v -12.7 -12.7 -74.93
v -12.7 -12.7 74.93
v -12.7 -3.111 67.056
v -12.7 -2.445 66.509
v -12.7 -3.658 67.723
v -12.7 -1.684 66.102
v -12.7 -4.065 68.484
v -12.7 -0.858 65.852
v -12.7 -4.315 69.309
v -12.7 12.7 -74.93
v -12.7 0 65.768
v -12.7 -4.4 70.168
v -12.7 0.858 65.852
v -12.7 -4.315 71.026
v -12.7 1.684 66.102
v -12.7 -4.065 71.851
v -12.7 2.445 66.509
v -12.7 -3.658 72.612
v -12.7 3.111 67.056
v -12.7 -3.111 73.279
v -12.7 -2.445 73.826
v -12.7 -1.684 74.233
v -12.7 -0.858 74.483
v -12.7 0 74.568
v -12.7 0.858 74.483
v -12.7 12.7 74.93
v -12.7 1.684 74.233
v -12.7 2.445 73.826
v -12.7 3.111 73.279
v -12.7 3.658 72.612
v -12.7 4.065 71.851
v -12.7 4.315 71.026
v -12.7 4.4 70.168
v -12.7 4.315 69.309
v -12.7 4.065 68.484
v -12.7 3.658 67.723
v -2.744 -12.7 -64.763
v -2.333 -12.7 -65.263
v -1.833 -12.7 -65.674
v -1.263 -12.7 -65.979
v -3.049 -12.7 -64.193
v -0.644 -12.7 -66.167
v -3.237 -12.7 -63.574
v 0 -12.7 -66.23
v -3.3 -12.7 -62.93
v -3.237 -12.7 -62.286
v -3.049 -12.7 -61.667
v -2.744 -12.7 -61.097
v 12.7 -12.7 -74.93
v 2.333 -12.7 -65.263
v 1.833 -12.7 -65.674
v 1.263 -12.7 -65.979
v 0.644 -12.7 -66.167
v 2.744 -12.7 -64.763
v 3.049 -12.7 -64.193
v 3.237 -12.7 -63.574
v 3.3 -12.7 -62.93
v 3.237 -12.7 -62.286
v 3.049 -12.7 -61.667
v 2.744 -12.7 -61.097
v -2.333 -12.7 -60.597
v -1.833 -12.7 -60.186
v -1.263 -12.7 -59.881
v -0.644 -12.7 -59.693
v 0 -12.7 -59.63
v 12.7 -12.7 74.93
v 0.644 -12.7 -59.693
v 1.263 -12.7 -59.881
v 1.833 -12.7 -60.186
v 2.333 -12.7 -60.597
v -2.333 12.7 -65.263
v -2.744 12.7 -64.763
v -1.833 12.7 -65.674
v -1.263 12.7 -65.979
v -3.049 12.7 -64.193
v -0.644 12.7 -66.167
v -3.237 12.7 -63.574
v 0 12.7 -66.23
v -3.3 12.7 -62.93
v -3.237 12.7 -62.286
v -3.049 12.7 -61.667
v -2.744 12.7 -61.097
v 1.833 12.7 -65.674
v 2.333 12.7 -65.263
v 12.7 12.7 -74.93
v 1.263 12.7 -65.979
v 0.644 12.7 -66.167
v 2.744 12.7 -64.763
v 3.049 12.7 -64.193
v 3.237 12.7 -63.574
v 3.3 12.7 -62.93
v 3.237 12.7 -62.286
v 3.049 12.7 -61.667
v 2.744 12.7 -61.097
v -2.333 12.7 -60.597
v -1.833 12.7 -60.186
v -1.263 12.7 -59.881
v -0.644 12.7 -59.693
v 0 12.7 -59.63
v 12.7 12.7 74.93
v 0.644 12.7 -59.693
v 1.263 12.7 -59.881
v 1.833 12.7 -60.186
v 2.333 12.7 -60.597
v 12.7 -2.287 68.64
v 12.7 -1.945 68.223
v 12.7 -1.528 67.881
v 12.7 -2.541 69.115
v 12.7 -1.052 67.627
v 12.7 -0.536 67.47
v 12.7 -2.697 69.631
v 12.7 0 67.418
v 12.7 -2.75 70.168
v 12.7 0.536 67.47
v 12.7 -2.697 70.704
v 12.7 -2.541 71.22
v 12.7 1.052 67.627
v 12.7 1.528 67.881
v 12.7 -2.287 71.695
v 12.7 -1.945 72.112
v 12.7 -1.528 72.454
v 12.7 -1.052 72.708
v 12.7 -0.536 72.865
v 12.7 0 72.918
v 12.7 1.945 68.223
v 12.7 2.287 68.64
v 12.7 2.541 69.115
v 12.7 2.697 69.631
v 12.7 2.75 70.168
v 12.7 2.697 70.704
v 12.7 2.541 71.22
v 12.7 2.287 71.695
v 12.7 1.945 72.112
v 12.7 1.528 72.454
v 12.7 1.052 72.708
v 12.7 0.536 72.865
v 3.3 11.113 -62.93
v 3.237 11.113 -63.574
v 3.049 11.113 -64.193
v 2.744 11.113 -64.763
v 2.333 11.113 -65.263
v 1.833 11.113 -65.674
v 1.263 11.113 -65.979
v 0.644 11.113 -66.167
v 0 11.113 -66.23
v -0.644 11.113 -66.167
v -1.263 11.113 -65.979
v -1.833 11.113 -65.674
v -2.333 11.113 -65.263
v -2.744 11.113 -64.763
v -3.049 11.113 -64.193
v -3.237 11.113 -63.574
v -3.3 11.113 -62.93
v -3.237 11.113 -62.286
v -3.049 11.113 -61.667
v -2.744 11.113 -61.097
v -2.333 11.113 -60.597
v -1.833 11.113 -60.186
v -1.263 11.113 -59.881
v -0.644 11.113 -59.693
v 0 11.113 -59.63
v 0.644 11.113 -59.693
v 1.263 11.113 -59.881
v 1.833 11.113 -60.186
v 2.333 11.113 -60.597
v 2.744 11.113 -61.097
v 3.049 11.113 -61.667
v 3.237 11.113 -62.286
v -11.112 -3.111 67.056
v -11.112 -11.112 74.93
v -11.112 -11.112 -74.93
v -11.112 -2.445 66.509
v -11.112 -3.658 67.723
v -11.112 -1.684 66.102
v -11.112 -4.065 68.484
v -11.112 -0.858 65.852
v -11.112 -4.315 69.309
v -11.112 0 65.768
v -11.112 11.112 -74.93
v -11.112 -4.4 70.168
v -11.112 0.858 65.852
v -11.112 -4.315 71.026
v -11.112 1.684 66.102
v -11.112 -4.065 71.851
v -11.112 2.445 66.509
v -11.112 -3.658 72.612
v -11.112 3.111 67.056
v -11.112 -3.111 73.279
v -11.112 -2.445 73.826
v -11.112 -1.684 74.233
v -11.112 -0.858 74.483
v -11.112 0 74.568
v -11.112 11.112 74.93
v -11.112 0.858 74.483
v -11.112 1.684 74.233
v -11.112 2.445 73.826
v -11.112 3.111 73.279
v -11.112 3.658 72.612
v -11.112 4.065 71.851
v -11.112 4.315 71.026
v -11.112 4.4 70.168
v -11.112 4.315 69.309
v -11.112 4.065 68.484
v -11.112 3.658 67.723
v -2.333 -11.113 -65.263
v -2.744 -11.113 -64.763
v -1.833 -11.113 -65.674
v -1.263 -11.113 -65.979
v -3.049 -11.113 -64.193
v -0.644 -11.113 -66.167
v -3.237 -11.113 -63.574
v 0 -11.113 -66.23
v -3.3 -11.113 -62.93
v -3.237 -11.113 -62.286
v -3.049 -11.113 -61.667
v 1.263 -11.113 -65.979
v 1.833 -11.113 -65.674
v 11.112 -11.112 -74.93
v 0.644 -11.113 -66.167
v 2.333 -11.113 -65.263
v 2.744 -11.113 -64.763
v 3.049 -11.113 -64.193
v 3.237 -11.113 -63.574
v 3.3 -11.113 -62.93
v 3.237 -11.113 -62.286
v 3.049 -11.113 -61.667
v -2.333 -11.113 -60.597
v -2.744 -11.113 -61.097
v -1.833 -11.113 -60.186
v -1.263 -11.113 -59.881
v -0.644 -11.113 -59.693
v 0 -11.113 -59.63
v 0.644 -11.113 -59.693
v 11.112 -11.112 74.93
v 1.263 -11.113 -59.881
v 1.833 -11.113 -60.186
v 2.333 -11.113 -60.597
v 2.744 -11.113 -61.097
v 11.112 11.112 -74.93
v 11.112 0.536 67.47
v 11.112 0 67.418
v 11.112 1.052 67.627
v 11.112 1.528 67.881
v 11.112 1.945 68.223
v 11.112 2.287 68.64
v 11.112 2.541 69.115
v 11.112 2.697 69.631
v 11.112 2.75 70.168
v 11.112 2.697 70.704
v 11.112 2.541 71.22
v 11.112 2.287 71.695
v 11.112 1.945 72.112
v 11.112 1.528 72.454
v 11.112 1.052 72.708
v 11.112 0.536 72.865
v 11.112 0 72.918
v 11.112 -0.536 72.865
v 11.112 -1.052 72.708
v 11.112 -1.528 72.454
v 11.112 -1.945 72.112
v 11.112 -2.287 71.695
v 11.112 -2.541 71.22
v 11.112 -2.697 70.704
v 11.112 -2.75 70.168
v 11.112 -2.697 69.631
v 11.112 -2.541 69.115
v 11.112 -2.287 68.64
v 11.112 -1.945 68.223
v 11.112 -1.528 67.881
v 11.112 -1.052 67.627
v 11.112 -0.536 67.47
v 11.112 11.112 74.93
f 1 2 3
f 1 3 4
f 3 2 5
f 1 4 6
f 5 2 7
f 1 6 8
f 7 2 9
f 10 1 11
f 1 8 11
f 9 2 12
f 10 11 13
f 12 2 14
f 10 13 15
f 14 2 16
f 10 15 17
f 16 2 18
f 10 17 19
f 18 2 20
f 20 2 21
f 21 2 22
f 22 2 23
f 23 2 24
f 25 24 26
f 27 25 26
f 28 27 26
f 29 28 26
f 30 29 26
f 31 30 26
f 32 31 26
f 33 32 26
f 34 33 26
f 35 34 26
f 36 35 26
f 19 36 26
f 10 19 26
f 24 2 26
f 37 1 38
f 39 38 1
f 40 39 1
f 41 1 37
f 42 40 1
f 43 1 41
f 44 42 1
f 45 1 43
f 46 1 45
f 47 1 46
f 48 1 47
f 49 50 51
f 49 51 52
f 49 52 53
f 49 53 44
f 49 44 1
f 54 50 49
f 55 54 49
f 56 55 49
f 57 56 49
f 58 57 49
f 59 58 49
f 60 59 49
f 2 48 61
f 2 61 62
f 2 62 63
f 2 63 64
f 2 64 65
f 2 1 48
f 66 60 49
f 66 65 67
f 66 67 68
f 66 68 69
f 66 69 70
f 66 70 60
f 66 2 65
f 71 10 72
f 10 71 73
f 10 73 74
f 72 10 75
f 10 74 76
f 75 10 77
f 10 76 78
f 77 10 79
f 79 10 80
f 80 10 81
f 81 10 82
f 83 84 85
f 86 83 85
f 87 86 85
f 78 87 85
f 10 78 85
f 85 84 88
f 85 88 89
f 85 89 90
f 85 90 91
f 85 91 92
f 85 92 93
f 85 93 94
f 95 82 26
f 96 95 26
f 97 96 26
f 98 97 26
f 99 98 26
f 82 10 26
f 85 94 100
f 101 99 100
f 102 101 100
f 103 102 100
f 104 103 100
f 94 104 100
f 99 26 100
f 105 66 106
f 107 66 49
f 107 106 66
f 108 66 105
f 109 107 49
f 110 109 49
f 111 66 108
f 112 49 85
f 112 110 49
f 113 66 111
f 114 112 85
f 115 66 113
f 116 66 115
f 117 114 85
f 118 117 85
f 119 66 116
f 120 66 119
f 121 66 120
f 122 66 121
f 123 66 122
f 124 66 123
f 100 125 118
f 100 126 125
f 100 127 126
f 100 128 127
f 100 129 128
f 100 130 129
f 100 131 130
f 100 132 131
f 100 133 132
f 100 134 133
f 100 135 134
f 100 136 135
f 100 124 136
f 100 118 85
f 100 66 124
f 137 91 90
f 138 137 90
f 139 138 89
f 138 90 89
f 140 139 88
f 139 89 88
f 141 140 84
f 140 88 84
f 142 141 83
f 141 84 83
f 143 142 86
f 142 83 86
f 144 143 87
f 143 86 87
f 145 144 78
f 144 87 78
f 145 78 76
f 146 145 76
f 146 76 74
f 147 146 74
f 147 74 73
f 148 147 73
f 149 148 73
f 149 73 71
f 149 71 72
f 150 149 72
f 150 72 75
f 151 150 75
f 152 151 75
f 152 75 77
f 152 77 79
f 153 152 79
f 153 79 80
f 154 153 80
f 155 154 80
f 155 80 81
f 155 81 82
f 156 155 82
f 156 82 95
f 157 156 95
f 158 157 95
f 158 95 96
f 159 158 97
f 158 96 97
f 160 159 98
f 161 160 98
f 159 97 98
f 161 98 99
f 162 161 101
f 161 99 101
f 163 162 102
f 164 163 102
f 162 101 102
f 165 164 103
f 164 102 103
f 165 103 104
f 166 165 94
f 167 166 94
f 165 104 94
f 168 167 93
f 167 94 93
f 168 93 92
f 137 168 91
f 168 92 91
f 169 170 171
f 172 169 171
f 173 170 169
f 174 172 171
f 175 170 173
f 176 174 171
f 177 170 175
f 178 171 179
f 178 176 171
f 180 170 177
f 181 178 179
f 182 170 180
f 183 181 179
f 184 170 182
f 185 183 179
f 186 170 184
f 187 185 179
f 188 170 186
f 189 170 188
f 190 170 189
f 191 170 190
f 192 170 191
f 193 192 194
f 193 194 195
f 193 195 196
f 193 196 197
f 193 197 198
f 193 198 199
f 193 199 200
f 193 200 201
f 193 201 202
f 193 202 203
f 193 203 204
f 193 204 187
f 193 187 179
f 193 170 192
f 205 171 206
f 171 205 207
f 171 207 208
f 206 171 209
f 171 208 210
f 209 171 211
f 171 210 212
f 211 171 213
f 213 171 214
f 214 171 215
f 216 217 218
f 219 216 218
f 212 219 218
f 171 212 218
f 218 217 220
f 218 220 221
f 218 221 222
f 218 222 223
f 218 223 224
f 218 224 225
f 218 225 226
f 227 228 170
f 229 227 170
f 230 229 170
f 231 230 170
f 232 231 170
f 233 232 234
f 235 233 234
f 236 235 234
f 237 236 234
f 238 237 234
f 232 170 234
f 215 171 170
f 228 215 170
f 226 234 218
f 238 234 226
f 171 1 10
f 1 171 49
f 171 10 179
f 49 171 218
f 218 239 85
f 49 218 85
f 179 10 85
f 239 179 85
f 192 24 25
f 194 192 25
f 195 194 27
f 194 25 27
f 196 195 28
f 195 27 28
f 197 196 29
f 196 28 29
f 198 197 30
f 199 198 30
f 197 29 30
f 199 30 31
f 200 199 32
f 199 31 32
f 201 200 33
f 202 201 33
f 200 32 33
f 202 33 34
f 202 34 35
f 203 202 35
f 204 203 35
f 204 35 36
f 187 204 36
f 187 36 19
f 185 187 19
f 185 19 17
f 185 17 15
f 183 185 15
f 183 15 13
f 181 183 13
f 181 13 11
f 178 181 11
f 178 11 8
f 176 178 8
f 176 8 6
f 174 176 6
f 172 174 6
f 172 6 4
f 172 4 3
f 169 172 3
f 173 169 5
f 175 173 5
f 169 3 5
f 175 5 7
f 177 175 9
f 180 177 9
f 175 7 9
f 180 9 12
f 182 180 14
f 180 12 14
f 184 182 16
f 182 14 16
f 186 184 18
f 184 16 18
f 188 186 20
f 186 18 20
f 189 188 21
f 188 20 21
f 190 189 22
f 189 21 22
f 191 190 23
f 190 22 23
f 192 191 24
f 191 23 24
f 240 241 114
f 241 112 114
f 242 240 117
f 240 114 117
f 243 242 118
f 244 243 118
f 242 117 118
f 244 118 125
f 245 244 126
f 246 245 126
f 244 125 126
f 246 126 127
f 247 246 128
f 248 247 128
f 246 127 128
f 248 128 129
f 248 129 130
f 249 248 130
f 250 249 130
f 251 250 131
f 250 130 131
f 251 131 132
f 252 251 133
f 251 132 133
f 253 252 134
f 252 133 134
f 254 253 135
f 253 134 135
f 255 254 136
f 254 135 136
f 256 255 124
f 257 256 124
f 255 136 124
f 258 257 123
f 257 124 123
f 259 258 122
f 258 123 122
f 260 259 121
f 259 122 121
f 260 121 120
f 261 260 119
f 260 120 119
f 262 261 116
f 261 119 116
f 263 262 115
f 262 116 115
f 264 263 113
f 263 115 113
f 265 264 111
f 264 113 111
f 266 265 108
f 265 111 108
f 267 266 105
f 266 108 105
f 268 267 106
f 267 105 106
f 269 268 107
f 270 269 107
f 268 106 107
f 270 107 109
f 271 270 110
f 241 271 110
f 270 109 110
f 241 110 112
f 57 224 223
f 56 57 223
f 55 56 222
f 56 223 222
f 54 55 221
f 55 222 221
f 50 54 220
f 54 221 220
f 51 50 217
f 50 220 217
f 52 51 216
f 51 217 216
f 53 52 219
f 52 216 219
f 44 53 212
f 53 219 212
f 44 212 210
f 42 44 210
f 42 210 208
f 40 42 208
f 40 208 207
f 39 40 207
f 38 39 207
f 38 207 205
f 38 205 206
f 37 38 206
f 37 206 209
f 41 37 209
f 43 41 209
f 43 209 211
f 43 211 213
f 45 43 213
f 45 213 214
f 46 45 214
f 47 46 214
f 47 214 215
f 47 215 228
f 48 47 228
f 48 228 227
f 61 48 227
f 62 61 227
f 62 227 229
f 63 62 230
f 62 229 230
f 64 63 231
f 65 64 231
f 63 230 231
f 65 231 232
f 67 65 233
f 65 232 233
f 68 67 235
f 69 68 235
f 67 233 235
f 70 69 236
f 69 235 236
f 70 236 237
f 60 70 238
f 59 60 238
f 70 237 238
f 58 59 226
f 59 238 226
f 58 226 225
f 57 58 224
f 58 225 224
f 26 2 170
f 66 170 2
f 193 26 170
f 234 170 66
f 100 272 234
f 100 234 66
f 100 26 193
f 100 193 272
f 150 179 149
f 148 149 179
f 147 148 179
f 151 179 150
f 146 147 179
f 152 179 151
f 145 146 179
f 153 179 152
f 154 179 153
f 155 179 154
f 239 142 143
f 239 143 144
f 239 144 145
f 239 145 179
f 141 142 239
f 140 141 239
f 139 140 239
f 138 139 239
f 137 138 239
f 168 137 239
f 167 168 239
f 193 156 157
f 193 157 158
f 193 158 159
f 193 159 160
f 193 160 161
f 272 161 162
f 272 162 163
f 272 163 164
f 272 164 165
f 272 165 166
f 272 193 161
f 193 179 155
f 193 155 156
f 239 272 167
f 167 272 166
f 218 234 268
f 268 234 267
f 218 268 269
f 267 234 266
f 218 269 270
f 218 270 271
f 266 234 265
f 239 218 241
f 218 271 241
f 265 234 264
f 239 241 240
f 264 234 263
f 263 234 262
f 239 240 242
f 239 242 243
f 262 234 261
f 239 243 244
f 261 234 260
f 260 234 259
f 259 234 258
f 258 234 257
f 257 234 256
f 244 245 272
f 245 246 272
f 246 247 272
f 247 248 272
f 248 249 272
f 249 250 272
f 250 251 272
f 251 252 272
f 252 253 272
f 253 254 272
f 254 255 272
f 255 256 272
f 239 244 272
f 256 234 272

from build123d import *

# Parameters (mm, degrees)
SKETCH1_W                      = 25.4
SKETCH1_H                      = 25.4
BOSS_EXTRUDE1_DEPTH            = 74.93
SHELL1_T                       = -1.5875
CBORE_FOR_M5_SHCS1_D           = 5.5
CBORE_FOR_M5_SHCS1_CBORE_D     = 8.8
CBORE_FOR_M5_SHCS1_CBORE_DEPTH = 5
M6_CLEARANCE_HOLE1_D           = 6.6


with BuildPart() as part:
    # Sketch1 → Boss-Extrude1 (new body, symmetric)
    with BuildSketch(Plane.XY):
        Rectangle(SKETCH1_W, SKETCH1_H)
    extrude(amount=BOSS_EXTRUDE1_DEPTH, both=True)

    # Shell1
    shell1_openings = [part.faces().sort_by_distance(p)[0] for p in [
        (0, 0, 74.93),
        (0, 0, -74.93),
    ]]
    offset(amount=SHELL1_T, openings=shell1_openings, kind=Kind.INTERSECTION)

    # CBORE for M5 SHCS1 (through all)
    with Locations(Plane.ZY.offset(12.7)):
        with Locations((70.1675, 0)):
            CounterBoreHole(CBORE_FOR_M5_SHCS1_D / 2, CBORE_FOR_M5_SHCS1_CBORE_D / 2, CBORE_FOR_M5_SHCS1_CBORE_DEPTH)

    # M6 Clearance Hole1 (through all)
    with Locations(Plane(origin=(0, -12.7, 0), x_dir=(-1, 0, 0), z_dir=(0, -1, 0))):
        with Locations((0, 62.93)):
            Hole(M6_CLEARANCE_HOLE1_D / 2)


solid = part.part
